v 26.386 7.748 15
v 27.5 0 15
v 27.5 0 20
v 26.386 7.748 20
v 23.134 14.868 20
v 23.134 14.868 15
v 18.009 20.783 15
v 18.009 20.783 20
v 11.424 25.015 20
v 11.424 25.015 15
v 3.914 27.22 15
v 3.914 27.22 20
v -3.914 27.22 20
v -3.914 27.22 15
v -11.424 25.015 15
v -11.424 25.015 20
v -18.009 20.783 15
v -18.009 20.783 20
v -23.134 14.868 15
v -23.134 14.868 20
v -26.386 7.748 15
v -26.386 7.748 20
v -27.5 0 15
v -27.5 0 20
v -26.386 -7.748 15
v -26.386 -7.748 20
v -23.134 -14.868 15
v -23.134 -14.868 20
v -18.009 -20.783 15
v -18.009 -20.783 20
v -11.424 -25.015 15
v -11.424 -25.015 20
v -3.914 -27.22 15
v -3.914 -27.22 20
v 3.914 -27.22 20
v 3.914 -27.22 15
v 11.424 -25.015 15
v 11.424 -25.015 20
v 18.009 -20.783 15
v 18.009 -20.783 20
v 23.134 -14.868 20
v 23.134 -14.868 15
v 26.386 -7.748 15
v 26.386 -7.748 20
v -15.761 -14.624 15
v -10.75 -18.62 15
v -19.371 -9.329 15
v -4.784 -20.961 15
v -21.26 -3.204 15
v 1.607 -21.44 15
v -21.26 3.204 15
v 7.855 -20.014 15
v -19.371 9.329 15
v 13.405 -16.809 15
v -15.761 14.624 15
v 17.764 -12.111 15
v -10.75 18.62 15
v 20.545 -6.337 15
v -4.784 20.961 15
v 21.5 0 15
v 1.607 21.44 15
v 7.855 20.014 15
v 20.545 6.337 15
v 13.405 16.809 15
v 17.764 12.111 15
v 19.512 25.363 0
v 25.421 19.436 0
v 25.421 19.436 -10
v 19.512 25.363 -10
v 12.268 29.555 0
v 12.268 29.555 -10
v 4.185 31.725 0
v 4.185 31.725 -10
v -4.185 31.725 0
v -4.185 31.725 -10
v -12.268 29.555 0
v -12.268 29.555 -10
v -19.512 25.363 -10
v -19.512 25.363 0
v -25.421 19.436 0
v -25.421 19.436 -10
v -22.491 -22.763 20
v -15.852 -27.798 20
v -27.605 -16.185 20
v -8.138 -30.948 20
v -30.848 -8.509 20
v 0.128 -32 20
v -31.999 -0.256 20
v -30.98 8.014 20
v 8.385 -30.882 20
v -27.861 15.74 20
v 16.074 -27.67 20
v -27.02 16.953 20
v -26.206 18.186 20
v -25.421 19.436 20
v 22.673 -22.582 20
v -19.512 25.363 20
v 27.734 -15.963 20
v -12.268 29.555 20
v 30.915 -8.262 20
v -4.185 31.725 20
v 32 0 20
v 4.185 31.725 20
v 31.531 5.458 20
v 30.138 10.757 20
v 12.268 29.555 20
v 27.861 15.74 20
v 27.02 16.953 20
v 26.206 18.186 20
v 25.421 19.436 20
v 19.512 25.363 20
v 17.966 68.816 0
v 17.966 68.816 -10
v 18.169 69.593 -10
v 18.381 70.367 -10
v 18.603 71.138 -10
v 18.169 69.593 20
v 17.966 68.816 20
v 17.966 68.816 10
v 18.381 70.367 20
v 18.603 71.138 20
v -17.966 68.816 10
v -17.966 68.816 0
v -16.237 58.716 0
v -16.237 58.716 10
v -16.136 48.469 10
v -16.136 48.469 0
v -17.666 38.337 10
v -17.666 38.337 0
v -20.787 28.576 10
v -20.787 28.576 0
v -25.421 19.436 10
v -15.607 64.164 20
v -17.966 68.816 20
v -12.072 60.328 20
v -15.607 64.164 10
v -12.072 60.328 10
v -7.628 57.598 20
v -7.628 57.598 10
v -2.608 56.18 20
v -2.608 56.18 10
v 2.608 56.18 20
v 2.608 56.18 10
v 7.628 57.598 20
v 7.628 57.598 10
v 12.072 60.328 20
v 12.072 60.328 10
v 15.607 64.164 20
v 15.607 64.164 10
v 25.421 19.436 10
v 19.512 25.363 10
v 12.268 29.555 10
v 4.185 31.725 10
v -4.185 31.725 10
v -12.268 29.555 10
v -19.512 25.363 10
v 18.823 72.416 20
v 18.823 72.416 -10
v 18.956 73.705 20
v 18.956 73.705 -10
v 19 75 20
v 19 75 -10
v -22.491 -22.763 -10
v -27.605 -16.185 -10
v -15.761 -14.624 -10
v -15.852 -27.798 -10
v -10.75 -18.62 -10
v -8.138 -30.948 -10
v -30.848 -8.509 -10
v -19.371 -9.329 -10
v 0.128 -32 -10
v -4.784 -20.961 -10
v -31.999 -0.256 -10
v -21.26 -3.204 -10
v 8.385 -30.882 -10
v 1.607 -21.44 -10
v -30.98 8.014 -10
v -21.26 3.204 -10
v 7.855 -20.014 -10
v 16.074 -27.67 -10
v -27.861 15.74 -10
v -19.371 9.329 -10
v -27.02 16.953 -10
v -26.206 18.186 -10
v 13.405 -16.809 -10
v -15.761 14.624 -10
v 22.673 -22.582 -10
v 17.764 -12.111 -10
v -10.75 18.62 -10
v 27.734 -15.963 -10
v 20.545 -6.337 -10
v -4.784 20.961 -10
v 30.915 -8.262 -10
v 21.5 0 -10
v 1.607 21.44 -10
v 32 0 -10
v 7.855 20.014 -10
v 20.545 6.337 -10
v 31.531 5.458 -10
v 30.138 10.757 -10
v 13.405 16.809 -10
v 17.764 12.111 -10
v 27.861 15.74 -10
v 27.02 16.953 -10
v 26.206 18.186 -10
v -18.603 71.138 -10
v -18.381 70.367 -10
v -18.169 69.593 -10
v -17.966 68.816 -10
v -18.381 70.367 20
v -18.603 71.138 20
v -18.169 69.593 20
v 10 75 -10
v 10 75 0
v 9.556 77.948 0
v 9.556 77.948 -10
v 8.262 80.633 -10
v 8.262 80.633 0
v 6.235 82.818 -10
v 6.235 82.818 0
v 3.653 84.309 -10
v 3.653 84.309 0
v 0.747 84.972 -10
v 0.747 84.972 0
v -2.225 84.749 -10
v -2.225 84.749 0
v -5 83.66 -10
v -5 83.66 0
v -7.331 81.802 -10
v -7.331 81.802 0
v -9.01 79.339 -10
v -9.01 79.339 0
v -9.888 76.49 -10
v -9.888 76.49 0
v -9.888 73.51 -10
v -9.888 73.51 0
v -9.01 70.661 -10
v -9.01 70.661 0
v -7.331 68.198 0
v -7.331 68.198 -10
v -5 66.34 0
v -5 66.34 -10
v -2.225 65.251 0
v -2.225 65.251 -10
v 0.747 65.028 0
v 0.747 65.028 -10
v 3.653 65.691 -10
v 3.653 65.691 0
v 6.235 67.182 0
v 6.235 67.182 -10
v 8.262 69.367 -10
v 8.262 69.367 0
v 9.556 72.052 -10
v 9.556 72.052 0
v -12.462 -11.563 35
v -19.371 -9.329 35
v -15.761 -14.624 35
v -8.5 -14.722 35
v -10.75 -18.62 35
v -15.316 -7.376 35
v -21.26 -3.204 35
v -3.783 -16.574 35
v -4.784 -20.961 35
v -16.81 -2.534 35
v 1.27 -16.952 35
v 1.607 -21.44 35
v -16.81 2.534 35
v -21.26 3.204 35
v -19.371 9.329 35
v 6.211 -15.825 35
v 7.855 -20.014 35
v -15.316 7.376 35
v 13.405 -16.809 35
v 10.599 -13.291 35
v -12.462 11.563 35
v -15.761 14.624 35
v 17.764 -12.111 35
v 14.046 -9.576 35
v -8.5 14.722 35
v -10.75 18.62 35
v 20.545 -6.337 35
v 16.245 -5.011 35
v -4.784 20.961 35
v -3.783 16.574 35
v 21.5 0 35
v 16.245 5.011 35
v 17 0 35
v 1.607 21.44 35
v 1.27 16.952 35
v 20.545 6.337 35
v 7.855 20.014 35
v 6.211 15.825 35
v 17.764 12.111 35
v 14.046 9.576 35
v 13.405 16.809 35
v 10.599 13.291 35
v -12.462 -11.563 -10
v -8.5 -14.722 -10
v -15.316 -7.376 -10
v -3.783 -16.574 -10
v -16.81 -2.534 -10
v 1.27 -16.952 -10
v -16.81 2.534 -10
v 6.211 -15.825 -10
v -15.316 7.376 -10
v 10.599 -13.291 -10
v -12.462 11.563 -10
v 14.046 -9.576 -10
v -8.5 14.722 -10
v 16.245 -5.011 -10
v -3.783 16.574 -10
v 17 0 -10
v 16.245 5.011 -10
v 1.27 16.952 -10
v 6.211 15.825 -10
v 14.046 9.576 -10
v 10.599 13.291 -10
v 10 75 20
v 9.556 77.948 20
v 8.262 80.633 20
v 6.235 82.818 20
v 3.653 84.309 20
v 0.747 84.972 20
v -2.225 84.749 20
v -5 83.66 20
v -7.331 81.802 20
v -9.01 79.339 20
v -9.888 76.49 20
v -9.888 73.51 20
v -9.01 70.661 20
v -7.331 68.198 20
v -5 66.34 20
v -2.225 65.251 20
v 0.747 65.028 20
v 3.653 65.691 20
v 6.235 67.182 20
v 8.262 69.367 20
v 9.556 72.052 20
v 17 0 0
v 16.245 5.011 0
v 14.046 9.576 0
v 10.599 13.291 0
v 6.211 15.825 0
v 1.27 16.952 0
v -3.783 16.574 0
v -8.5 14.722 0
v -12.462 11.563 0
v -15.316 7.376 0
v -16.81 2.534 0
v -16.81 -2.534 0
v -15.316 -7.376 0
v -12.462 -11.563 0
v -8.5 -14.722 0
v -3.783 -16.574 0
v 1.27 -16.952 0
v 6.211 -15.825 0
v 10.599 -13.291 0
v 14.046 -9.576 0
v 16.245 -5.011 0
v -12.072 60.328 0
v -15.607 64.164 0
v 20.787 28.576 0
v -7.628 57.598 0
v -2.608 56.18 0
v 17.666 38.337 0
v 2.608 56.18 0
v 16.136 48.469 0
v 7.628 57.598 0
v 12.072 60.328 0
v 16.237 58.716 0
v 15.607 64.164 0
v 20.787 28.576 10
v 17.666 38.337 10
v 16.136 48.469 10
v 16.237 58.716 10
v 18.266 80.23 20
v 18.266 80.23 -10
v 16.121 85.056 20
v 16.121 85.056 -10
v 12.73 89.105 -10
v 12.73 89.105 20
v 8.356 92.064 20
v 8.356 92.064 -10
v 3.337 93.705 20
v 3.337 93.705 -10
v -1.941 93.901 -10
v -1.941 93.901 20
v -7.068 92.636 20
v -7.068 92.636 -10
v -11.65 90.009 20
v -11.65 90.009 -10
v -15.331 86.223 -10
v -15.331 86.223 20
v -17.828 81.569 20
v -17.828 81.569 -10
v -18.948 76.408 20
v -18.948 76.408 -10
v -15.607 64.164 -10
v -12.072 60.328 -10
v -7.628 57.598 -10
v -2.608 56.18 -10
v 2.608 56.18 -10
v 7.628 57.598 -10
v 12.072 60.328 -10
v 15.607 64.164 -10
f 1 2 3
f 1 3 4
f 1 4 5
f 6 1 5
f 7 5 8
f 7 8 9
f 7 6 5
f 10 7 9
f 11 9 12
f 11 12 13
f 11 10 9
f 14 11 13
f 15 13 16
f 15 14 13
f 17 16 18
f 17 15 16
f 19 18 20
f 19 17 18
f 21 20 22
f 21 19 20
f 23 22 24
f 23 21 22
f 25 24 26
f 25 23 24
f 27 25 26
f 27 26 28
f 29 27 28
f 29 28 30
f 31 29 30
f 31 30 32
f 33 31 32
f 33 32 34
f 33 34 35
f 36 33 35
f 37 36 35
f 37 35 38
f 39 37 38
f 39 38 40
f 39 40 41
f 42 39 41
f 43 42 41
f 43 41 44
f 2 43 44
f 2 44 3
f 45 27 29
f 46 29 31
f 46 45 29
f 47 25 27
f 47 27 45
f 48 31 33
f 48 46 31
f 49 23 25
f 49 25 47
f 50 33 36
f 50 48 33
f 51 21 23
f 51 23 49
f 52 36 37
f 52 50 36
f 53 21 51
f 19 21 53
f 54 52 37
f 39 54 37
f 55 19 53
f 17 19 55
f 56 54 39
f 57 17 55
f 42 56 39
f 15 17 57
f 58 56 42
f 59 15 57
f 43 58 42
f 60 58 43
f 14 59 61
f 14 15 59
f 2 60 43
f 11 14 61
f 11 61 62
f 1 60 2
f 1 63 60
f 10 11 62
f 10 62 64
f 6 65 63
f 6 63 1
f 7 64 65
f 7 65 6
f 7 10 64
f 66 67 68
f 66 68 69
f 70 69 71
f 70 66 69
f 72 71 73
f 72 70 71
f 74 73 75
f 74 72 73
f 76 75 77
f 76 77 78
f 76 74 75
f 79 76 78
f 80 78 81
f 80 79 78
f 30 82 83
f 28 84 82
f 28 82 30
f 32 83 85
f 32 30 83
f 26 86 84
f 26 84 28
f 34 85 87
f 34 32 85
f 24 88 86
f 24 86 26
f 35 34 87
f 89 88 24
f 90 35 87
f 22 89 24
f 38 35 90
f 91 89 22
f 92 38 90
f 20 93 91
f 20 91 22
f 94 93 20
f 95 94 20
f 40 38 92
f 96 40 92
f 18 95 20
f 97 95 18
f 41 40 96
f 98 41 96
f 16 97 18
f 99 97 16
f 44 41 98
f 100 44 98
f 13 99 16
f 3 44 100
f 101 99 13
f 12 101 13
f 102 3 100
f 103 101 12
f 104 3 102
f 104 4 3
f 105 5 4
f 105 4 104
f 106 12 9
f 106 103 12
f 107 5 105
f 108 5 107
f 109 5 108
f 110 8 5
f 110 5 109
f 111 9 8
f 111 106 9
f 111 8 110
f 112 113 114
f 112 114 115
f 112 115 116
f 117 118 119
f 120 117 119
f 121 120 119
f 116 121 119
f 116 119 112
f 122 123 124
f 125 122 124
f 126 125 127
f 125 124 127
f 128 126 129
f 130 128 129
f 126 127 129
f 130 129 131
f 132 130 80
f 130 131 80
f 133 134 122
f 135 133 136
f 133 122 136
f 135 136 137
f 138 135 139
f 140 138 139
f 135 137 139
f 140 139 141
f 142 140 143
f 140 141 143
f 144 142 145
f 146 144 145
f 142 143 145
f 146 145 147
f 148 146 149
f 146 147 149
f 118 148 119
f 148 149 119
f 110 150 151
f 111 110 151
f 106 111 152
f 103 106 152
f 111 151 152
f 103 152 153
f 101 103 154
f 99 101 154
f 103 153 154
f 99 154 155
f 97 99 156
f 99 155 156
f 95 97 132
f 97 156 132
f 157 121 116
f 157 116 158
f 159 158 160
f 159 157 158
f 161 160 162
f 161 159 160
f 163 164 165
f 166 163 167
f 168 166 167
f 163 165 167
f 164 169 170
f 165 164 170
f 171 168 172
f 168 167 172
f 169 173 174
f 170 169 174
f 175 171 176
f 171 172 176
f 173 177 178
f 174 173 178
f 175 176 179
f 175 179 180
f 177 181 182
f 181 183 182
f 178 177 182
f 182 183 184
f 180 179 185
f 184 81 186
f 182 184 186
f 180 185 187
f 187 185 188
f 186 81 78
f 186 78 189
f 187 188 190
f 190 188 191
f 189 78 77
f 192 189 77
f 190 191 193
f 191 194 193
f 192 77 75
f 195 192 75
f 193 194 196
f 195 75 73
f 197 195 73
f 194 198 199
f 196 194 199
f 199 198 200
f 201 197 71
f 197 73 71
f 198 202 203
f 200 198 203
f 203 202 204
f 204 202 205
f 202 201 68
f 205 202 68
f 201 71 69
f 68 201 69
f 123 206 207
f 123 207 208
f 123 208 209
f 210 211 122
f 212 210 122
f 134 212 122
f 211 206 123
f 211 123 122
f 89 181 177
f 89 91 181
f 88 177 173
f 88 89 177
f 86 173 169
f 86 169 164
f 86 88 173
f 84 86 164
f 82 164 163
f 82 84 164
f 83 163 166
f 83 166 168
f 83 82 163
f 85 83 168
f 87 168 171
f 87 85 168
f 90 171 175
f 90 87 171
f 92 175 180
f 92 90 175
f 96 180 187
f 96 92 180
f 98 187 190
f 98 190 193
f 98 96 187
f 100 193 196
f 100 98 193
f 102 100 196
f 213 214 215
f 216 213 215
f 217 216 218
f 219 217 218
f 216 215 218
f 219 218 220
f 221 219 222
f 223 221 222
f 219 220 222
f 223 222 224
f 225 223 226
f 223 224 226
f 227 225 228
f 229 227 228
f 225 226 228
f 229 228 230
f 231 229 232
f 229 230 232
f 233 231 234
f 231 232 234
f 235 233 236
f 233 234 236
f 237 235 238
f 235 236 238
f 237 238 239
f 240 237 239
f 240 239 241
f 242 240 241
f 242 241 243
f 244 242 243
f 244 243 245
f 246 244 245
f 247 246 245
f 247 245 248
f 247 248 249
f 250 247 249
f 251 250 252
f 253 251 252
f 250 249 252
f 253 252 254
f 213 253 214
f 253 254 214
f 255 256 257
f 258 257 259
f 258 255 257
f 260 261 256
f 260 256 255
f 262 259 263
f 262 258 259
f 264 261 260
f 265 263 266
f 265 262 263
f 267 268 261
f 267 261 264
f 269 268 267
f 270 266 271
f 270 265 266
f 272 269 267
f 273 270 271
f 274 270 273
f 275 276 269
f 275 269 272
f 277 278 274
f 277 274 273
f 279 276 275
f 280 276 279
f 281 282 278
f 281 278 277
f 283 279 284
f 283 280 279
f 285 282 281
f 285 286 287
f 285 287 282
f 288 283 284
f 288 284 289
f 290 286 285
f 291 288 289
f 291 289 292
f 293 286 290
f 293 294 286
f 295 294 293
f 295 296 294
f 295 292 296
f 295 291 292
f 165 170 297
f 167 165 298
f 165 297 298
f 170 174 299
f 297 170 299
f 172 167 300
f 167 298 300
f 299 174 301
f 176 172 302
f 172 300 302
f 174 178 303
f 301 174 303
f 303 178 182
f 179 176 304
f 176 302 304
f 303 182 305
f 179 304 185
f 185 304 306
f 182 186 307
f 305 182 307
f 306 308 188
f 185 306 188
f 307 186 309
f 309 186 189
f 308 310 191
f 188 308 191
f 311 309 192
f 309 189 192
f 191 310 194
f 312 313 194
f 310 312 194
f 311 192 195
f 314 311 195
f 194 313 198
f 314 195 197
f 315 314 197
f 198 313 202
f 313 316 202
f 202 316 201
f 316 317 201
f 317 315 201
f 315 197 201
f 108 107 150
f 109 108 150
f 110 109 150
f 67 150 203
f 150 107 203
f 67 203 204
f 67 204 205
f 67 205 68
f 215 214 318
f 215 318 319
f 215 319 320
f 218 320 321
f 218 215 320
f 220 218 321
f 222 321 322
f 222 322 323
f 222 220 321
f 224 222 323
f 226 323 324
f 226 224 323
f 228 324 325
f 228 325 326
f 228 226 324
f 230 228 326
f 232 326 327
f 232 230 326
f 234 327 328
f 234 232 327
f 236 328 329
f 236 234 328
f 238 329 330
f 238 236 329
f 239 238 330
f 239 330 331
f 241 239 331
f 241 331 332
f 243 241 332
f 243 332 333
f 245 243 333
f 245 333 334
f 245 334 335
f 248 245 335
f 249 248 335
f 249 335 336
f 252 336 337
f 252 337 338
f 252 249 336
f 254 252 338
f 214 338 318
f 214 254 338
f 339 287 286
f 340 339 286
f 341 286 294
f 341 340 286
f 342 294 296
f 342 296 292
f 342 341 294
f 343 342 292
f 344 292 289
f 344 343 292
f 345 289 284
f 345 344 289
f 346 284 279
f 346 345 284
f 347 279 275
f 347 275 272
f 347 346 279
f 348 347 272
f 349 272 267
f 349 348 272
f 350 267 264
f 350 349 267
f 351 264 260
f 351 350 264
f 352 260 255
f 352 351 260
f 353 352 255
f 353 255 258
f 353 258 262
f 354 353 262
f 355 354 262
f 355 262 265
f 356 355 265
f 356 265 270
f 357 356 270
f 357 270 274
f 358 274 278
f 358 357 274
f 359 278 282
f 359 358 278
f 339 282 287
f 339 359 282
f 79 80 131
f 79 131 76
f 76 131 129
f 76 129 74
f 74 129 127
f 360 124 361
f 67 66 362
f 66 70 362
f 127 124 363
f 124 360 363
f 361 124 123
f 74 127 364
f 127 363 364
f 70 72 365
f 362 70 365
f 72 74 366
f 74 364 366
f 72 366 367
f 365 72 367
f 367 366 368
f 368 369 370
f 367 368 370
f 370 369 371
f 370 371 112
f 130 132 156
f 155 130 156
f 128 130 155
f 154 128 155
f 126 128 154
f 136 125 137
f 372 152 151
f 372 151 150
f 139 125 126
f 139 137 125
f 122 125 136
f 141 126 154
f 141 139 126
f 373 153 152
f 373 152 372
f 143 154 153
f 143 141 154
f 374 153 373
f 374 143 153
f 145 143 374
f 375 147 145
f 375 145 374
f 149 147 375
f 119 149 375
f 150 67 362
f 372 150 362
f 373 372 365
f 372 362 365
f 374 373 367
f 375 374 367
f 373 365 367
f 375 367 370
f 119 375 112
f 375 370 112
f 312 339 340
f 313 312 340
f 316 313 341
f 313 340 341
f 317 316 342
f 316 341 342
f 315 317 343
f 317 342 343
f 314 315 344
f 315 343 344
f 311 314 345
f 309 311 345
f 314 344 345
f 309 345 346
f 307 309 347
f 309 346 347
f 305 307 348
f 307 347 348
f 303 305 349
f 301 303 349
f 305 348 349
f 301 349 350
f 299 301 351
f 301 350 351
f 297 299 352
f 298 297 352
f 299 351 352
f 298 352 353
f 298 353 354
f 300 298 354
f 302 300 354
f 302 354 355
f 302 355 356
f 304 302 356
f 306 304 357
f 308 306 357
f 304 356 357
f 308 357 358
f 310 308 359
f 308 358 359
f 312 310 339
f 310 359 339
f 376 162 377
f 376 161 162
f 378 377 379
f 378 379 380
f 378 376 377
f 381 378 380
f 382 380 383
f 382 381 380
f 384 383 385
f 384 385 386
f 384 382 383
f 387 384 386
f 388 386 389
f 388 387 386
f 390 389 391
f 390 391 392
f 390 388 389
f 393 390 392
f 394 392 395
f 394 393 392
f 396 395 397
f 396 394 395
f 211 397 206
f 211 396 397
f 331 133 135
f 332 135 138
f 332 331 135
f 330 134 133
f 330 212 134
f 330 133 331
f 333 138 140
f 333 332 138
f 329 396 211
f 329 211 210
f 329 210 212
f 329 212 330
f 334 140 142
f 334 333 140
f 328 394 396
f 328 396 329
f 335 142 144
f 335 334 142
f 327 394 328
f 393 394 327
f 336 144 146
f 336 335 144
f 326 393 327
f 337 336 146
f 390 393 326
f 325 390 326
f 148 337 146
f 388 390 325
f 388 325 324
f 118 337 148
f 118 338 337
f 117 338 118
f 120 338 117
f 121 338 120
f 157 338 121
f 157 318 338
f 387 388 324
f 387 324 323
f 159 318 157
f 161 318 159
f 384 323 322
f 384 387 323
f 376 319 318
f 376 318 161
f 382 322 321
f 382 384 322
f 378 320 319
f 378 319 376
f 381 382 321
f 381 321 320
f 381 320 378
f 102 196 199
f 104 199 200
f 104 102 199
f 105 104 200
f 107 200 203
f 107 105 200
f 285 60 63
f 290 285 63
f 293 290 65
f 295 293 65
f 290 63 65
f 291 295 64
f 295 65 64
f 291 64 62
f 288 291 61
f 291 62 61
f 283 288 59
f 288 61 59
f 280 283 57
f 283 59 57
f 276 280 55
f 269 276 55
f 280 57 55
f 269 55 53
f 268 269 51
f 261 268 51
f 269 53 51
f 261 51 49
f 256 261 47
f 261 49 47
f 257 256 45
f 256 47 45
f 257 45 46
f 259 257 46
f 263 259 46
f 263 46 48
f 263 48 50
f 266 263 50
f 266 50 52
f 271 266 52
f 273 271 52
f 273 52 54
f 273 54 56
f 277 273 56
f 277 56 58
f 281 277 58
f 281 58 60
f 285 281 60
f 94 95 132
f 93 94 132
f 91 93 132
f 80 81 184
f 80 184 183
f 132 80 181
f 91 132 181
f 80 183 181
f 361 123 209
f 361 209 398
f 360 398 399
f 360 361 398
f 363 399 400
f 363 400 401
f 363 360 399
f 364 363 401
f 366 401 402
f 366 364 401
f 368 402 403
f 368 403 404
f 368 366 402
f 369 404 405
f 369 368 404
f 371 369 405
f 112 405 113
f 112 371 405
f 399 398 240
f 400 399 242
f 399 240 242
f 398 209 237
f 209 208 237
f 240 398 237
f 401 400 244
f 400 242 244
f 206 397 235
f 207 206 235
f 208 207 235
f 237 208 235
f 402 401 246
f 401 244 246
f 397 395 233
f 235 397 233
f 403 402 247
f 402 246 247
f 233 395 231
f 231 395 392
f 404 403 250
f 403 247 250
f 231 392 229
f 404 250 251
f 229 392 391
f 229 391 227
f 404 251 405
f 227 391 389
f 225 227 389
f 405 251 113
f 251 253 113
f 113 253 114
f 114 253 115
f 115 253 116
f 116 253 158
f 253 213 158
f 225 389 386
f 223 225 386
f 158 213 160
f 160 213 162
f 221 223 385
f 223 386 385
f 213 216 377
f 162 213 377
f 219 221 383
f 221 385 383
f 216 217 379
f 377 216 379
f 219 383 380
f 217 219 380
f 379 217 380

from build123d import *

# Parameters (mm, degrees)
BOSS_EXTRUDE6_DEPTH       = 10
BOSS_EXTRUDE10_DEPTH      = 20
BOSS_EXTRUDE10_DEPTH_BACK = 10
SKETCH1_11_R              = 27.5
BOSS_EXTRUDE11_DEPTH      = 20
BOSS_EXTRUDE11_DEPTH_BACK = 10
SKETCH1_12_R              = 10
BOSS_EXTRUDE12_DEPTH      = 15
BOSS_EXTRUDE12_DEPTH_BACK = 10
SKETCH1_13_R              = 27.5
SKETCH1_13_R_2            = 21.5
BOSS_EXTRUDE13_DEPTH      = 35
BOSS_EXTRUDE13_DEPTH_BACK = 10
SKETCH1_14_R              = 21.5
SKETCH1_14_R_2            = 17


with BuildPart() as part:
    # Sketch1 → Boss-Extrude6 (new body)
    with BuildSketch(Plane.XY):
        with BuildLine():
            ThreePointArc((-25.420986444, 19.436394938), (0, 32), (25.420986444, 19.436394938))
            ThreePointArc((25.420986444, 19.436394938), (16.698881669, 43.372332346), (17.965602149, 68.816381365))
            ThreePointArc((17.965602149, 68.816381365), (0, 56), (-17.965602149, 68.816381365))
            ThreePointArc((-17.965602149, 68.816381365), (-16.698881669, 43.372332346), (-25.420986444, 19.436394938))
        make_face()
    extrude(amount=BOSS_EXTRUDE6_DEPTH)

    # Sketch1<11> → Boss-Extrude10 (add, two sides: drawn at the far end of the back side and taken through both)
    with BuildSketch(Plane.XY.offset(-BOSS_EXTRUDE10_DEPTH_BACK)):
        with BuildLine():
            ThreePointArc((-27.861197674, 15.740192635), (-8.137618645, -30.948007412), (32, 0))
            ThreePointArc((32, 0), (30.948007412, 8.137618645), (27.861197674, 15.740192635))
            ThreePointArc((27.861197674, 15.740192635), (26.609230485, 17.567258961), (25.420986444, 19.436394938))
            ThreePointArc((25.420986444, 19.436394938), (0, 32), (-25.420986444, 19.436394938))
            ThreePointArc((-25.420986444, 19.436394938), (-26.609230485, 17.567258961), (-27.861197674, 15.740192635))
        make_face()
        Circle(SKETCH1_11_R, mode=Mode.SUBTRACT)
    extrude(amount=BOSS_EXTRUDE10_DEPTH + BOSS_EXTRUDE10_DEPTH_BACK)

    # Sketch1<12> → Boss-Extrude11 (add, two sides: drawn at the far end of the back side and taken through both)
    with BuildSketch(Plane.XY.offset(-BOSS_EXTRUDE11_DEPTH_BACK)):
        with BuildLine():
            ThreePointArc((-17.965602149, 68.816381365), (0, 56), (17.965602149, 68.816381365))
            ThreePointArc((17.965602149, 68.816381365), (18.273648583, 69.980415685), (18.603456766, 71.138472275))
            ThreePointArc((18.603456766, 71.138472275), (18.900604204, 73.059082504), (19, 75))
            ThreePointArc((19, 75), (-1.940917496, 93.900604204), (-18.603456766, 71.138472275))
            ThreePointArc((-18.603456766, 71.138472275), (-18.273648583, 69.980415685), (-17.965602149, 68.816381365))
        make_face()
        with Locations((0, 75)):
            Circle(SKETCH1_12_R, mode=Mode.SUBTRACT)
    extrude(amount=BOSS_EXTRUDE11_DEPTH + BOSS_EXTRUDE11_DEPTH_BACK)

    # Sketch1<13> → Boss-Extrude12 (add, two sides: drawn at the far end of the back side and taken through both)
    with BuildSketch(Plane.XY.offset(-BOSS_EXTRUDE12_DEPTH_BACK)):
        Circle(SKETCH1_13_R)
        Circle(SKETCH1_13_R_2, mode=Mode.SUBTRACT)
    extrude(amount=BOSS_EXTRUDE12_DEPTH + BOSS_EXTRUDE12_DEPTH_BACK)

    # Sketch1<14> → Boss-Extrude13 (add, two sides: drawn at the far end of the back side and taken through both)
    with BuildSketch(Plane.XY.offset(-BOSS_EXTRUDE13_DEPTH_BACK)):
        Circle(SKETCH1_14_R)
        Circle(SKETCH1_14_R_2, mode=Mode.SUBTRACT)
    extrude(amount=BOSS_EXTRUDE13_DEPTH + BOSS_EXTRUDE13_DEPTH_BACK)


solid = part.part
